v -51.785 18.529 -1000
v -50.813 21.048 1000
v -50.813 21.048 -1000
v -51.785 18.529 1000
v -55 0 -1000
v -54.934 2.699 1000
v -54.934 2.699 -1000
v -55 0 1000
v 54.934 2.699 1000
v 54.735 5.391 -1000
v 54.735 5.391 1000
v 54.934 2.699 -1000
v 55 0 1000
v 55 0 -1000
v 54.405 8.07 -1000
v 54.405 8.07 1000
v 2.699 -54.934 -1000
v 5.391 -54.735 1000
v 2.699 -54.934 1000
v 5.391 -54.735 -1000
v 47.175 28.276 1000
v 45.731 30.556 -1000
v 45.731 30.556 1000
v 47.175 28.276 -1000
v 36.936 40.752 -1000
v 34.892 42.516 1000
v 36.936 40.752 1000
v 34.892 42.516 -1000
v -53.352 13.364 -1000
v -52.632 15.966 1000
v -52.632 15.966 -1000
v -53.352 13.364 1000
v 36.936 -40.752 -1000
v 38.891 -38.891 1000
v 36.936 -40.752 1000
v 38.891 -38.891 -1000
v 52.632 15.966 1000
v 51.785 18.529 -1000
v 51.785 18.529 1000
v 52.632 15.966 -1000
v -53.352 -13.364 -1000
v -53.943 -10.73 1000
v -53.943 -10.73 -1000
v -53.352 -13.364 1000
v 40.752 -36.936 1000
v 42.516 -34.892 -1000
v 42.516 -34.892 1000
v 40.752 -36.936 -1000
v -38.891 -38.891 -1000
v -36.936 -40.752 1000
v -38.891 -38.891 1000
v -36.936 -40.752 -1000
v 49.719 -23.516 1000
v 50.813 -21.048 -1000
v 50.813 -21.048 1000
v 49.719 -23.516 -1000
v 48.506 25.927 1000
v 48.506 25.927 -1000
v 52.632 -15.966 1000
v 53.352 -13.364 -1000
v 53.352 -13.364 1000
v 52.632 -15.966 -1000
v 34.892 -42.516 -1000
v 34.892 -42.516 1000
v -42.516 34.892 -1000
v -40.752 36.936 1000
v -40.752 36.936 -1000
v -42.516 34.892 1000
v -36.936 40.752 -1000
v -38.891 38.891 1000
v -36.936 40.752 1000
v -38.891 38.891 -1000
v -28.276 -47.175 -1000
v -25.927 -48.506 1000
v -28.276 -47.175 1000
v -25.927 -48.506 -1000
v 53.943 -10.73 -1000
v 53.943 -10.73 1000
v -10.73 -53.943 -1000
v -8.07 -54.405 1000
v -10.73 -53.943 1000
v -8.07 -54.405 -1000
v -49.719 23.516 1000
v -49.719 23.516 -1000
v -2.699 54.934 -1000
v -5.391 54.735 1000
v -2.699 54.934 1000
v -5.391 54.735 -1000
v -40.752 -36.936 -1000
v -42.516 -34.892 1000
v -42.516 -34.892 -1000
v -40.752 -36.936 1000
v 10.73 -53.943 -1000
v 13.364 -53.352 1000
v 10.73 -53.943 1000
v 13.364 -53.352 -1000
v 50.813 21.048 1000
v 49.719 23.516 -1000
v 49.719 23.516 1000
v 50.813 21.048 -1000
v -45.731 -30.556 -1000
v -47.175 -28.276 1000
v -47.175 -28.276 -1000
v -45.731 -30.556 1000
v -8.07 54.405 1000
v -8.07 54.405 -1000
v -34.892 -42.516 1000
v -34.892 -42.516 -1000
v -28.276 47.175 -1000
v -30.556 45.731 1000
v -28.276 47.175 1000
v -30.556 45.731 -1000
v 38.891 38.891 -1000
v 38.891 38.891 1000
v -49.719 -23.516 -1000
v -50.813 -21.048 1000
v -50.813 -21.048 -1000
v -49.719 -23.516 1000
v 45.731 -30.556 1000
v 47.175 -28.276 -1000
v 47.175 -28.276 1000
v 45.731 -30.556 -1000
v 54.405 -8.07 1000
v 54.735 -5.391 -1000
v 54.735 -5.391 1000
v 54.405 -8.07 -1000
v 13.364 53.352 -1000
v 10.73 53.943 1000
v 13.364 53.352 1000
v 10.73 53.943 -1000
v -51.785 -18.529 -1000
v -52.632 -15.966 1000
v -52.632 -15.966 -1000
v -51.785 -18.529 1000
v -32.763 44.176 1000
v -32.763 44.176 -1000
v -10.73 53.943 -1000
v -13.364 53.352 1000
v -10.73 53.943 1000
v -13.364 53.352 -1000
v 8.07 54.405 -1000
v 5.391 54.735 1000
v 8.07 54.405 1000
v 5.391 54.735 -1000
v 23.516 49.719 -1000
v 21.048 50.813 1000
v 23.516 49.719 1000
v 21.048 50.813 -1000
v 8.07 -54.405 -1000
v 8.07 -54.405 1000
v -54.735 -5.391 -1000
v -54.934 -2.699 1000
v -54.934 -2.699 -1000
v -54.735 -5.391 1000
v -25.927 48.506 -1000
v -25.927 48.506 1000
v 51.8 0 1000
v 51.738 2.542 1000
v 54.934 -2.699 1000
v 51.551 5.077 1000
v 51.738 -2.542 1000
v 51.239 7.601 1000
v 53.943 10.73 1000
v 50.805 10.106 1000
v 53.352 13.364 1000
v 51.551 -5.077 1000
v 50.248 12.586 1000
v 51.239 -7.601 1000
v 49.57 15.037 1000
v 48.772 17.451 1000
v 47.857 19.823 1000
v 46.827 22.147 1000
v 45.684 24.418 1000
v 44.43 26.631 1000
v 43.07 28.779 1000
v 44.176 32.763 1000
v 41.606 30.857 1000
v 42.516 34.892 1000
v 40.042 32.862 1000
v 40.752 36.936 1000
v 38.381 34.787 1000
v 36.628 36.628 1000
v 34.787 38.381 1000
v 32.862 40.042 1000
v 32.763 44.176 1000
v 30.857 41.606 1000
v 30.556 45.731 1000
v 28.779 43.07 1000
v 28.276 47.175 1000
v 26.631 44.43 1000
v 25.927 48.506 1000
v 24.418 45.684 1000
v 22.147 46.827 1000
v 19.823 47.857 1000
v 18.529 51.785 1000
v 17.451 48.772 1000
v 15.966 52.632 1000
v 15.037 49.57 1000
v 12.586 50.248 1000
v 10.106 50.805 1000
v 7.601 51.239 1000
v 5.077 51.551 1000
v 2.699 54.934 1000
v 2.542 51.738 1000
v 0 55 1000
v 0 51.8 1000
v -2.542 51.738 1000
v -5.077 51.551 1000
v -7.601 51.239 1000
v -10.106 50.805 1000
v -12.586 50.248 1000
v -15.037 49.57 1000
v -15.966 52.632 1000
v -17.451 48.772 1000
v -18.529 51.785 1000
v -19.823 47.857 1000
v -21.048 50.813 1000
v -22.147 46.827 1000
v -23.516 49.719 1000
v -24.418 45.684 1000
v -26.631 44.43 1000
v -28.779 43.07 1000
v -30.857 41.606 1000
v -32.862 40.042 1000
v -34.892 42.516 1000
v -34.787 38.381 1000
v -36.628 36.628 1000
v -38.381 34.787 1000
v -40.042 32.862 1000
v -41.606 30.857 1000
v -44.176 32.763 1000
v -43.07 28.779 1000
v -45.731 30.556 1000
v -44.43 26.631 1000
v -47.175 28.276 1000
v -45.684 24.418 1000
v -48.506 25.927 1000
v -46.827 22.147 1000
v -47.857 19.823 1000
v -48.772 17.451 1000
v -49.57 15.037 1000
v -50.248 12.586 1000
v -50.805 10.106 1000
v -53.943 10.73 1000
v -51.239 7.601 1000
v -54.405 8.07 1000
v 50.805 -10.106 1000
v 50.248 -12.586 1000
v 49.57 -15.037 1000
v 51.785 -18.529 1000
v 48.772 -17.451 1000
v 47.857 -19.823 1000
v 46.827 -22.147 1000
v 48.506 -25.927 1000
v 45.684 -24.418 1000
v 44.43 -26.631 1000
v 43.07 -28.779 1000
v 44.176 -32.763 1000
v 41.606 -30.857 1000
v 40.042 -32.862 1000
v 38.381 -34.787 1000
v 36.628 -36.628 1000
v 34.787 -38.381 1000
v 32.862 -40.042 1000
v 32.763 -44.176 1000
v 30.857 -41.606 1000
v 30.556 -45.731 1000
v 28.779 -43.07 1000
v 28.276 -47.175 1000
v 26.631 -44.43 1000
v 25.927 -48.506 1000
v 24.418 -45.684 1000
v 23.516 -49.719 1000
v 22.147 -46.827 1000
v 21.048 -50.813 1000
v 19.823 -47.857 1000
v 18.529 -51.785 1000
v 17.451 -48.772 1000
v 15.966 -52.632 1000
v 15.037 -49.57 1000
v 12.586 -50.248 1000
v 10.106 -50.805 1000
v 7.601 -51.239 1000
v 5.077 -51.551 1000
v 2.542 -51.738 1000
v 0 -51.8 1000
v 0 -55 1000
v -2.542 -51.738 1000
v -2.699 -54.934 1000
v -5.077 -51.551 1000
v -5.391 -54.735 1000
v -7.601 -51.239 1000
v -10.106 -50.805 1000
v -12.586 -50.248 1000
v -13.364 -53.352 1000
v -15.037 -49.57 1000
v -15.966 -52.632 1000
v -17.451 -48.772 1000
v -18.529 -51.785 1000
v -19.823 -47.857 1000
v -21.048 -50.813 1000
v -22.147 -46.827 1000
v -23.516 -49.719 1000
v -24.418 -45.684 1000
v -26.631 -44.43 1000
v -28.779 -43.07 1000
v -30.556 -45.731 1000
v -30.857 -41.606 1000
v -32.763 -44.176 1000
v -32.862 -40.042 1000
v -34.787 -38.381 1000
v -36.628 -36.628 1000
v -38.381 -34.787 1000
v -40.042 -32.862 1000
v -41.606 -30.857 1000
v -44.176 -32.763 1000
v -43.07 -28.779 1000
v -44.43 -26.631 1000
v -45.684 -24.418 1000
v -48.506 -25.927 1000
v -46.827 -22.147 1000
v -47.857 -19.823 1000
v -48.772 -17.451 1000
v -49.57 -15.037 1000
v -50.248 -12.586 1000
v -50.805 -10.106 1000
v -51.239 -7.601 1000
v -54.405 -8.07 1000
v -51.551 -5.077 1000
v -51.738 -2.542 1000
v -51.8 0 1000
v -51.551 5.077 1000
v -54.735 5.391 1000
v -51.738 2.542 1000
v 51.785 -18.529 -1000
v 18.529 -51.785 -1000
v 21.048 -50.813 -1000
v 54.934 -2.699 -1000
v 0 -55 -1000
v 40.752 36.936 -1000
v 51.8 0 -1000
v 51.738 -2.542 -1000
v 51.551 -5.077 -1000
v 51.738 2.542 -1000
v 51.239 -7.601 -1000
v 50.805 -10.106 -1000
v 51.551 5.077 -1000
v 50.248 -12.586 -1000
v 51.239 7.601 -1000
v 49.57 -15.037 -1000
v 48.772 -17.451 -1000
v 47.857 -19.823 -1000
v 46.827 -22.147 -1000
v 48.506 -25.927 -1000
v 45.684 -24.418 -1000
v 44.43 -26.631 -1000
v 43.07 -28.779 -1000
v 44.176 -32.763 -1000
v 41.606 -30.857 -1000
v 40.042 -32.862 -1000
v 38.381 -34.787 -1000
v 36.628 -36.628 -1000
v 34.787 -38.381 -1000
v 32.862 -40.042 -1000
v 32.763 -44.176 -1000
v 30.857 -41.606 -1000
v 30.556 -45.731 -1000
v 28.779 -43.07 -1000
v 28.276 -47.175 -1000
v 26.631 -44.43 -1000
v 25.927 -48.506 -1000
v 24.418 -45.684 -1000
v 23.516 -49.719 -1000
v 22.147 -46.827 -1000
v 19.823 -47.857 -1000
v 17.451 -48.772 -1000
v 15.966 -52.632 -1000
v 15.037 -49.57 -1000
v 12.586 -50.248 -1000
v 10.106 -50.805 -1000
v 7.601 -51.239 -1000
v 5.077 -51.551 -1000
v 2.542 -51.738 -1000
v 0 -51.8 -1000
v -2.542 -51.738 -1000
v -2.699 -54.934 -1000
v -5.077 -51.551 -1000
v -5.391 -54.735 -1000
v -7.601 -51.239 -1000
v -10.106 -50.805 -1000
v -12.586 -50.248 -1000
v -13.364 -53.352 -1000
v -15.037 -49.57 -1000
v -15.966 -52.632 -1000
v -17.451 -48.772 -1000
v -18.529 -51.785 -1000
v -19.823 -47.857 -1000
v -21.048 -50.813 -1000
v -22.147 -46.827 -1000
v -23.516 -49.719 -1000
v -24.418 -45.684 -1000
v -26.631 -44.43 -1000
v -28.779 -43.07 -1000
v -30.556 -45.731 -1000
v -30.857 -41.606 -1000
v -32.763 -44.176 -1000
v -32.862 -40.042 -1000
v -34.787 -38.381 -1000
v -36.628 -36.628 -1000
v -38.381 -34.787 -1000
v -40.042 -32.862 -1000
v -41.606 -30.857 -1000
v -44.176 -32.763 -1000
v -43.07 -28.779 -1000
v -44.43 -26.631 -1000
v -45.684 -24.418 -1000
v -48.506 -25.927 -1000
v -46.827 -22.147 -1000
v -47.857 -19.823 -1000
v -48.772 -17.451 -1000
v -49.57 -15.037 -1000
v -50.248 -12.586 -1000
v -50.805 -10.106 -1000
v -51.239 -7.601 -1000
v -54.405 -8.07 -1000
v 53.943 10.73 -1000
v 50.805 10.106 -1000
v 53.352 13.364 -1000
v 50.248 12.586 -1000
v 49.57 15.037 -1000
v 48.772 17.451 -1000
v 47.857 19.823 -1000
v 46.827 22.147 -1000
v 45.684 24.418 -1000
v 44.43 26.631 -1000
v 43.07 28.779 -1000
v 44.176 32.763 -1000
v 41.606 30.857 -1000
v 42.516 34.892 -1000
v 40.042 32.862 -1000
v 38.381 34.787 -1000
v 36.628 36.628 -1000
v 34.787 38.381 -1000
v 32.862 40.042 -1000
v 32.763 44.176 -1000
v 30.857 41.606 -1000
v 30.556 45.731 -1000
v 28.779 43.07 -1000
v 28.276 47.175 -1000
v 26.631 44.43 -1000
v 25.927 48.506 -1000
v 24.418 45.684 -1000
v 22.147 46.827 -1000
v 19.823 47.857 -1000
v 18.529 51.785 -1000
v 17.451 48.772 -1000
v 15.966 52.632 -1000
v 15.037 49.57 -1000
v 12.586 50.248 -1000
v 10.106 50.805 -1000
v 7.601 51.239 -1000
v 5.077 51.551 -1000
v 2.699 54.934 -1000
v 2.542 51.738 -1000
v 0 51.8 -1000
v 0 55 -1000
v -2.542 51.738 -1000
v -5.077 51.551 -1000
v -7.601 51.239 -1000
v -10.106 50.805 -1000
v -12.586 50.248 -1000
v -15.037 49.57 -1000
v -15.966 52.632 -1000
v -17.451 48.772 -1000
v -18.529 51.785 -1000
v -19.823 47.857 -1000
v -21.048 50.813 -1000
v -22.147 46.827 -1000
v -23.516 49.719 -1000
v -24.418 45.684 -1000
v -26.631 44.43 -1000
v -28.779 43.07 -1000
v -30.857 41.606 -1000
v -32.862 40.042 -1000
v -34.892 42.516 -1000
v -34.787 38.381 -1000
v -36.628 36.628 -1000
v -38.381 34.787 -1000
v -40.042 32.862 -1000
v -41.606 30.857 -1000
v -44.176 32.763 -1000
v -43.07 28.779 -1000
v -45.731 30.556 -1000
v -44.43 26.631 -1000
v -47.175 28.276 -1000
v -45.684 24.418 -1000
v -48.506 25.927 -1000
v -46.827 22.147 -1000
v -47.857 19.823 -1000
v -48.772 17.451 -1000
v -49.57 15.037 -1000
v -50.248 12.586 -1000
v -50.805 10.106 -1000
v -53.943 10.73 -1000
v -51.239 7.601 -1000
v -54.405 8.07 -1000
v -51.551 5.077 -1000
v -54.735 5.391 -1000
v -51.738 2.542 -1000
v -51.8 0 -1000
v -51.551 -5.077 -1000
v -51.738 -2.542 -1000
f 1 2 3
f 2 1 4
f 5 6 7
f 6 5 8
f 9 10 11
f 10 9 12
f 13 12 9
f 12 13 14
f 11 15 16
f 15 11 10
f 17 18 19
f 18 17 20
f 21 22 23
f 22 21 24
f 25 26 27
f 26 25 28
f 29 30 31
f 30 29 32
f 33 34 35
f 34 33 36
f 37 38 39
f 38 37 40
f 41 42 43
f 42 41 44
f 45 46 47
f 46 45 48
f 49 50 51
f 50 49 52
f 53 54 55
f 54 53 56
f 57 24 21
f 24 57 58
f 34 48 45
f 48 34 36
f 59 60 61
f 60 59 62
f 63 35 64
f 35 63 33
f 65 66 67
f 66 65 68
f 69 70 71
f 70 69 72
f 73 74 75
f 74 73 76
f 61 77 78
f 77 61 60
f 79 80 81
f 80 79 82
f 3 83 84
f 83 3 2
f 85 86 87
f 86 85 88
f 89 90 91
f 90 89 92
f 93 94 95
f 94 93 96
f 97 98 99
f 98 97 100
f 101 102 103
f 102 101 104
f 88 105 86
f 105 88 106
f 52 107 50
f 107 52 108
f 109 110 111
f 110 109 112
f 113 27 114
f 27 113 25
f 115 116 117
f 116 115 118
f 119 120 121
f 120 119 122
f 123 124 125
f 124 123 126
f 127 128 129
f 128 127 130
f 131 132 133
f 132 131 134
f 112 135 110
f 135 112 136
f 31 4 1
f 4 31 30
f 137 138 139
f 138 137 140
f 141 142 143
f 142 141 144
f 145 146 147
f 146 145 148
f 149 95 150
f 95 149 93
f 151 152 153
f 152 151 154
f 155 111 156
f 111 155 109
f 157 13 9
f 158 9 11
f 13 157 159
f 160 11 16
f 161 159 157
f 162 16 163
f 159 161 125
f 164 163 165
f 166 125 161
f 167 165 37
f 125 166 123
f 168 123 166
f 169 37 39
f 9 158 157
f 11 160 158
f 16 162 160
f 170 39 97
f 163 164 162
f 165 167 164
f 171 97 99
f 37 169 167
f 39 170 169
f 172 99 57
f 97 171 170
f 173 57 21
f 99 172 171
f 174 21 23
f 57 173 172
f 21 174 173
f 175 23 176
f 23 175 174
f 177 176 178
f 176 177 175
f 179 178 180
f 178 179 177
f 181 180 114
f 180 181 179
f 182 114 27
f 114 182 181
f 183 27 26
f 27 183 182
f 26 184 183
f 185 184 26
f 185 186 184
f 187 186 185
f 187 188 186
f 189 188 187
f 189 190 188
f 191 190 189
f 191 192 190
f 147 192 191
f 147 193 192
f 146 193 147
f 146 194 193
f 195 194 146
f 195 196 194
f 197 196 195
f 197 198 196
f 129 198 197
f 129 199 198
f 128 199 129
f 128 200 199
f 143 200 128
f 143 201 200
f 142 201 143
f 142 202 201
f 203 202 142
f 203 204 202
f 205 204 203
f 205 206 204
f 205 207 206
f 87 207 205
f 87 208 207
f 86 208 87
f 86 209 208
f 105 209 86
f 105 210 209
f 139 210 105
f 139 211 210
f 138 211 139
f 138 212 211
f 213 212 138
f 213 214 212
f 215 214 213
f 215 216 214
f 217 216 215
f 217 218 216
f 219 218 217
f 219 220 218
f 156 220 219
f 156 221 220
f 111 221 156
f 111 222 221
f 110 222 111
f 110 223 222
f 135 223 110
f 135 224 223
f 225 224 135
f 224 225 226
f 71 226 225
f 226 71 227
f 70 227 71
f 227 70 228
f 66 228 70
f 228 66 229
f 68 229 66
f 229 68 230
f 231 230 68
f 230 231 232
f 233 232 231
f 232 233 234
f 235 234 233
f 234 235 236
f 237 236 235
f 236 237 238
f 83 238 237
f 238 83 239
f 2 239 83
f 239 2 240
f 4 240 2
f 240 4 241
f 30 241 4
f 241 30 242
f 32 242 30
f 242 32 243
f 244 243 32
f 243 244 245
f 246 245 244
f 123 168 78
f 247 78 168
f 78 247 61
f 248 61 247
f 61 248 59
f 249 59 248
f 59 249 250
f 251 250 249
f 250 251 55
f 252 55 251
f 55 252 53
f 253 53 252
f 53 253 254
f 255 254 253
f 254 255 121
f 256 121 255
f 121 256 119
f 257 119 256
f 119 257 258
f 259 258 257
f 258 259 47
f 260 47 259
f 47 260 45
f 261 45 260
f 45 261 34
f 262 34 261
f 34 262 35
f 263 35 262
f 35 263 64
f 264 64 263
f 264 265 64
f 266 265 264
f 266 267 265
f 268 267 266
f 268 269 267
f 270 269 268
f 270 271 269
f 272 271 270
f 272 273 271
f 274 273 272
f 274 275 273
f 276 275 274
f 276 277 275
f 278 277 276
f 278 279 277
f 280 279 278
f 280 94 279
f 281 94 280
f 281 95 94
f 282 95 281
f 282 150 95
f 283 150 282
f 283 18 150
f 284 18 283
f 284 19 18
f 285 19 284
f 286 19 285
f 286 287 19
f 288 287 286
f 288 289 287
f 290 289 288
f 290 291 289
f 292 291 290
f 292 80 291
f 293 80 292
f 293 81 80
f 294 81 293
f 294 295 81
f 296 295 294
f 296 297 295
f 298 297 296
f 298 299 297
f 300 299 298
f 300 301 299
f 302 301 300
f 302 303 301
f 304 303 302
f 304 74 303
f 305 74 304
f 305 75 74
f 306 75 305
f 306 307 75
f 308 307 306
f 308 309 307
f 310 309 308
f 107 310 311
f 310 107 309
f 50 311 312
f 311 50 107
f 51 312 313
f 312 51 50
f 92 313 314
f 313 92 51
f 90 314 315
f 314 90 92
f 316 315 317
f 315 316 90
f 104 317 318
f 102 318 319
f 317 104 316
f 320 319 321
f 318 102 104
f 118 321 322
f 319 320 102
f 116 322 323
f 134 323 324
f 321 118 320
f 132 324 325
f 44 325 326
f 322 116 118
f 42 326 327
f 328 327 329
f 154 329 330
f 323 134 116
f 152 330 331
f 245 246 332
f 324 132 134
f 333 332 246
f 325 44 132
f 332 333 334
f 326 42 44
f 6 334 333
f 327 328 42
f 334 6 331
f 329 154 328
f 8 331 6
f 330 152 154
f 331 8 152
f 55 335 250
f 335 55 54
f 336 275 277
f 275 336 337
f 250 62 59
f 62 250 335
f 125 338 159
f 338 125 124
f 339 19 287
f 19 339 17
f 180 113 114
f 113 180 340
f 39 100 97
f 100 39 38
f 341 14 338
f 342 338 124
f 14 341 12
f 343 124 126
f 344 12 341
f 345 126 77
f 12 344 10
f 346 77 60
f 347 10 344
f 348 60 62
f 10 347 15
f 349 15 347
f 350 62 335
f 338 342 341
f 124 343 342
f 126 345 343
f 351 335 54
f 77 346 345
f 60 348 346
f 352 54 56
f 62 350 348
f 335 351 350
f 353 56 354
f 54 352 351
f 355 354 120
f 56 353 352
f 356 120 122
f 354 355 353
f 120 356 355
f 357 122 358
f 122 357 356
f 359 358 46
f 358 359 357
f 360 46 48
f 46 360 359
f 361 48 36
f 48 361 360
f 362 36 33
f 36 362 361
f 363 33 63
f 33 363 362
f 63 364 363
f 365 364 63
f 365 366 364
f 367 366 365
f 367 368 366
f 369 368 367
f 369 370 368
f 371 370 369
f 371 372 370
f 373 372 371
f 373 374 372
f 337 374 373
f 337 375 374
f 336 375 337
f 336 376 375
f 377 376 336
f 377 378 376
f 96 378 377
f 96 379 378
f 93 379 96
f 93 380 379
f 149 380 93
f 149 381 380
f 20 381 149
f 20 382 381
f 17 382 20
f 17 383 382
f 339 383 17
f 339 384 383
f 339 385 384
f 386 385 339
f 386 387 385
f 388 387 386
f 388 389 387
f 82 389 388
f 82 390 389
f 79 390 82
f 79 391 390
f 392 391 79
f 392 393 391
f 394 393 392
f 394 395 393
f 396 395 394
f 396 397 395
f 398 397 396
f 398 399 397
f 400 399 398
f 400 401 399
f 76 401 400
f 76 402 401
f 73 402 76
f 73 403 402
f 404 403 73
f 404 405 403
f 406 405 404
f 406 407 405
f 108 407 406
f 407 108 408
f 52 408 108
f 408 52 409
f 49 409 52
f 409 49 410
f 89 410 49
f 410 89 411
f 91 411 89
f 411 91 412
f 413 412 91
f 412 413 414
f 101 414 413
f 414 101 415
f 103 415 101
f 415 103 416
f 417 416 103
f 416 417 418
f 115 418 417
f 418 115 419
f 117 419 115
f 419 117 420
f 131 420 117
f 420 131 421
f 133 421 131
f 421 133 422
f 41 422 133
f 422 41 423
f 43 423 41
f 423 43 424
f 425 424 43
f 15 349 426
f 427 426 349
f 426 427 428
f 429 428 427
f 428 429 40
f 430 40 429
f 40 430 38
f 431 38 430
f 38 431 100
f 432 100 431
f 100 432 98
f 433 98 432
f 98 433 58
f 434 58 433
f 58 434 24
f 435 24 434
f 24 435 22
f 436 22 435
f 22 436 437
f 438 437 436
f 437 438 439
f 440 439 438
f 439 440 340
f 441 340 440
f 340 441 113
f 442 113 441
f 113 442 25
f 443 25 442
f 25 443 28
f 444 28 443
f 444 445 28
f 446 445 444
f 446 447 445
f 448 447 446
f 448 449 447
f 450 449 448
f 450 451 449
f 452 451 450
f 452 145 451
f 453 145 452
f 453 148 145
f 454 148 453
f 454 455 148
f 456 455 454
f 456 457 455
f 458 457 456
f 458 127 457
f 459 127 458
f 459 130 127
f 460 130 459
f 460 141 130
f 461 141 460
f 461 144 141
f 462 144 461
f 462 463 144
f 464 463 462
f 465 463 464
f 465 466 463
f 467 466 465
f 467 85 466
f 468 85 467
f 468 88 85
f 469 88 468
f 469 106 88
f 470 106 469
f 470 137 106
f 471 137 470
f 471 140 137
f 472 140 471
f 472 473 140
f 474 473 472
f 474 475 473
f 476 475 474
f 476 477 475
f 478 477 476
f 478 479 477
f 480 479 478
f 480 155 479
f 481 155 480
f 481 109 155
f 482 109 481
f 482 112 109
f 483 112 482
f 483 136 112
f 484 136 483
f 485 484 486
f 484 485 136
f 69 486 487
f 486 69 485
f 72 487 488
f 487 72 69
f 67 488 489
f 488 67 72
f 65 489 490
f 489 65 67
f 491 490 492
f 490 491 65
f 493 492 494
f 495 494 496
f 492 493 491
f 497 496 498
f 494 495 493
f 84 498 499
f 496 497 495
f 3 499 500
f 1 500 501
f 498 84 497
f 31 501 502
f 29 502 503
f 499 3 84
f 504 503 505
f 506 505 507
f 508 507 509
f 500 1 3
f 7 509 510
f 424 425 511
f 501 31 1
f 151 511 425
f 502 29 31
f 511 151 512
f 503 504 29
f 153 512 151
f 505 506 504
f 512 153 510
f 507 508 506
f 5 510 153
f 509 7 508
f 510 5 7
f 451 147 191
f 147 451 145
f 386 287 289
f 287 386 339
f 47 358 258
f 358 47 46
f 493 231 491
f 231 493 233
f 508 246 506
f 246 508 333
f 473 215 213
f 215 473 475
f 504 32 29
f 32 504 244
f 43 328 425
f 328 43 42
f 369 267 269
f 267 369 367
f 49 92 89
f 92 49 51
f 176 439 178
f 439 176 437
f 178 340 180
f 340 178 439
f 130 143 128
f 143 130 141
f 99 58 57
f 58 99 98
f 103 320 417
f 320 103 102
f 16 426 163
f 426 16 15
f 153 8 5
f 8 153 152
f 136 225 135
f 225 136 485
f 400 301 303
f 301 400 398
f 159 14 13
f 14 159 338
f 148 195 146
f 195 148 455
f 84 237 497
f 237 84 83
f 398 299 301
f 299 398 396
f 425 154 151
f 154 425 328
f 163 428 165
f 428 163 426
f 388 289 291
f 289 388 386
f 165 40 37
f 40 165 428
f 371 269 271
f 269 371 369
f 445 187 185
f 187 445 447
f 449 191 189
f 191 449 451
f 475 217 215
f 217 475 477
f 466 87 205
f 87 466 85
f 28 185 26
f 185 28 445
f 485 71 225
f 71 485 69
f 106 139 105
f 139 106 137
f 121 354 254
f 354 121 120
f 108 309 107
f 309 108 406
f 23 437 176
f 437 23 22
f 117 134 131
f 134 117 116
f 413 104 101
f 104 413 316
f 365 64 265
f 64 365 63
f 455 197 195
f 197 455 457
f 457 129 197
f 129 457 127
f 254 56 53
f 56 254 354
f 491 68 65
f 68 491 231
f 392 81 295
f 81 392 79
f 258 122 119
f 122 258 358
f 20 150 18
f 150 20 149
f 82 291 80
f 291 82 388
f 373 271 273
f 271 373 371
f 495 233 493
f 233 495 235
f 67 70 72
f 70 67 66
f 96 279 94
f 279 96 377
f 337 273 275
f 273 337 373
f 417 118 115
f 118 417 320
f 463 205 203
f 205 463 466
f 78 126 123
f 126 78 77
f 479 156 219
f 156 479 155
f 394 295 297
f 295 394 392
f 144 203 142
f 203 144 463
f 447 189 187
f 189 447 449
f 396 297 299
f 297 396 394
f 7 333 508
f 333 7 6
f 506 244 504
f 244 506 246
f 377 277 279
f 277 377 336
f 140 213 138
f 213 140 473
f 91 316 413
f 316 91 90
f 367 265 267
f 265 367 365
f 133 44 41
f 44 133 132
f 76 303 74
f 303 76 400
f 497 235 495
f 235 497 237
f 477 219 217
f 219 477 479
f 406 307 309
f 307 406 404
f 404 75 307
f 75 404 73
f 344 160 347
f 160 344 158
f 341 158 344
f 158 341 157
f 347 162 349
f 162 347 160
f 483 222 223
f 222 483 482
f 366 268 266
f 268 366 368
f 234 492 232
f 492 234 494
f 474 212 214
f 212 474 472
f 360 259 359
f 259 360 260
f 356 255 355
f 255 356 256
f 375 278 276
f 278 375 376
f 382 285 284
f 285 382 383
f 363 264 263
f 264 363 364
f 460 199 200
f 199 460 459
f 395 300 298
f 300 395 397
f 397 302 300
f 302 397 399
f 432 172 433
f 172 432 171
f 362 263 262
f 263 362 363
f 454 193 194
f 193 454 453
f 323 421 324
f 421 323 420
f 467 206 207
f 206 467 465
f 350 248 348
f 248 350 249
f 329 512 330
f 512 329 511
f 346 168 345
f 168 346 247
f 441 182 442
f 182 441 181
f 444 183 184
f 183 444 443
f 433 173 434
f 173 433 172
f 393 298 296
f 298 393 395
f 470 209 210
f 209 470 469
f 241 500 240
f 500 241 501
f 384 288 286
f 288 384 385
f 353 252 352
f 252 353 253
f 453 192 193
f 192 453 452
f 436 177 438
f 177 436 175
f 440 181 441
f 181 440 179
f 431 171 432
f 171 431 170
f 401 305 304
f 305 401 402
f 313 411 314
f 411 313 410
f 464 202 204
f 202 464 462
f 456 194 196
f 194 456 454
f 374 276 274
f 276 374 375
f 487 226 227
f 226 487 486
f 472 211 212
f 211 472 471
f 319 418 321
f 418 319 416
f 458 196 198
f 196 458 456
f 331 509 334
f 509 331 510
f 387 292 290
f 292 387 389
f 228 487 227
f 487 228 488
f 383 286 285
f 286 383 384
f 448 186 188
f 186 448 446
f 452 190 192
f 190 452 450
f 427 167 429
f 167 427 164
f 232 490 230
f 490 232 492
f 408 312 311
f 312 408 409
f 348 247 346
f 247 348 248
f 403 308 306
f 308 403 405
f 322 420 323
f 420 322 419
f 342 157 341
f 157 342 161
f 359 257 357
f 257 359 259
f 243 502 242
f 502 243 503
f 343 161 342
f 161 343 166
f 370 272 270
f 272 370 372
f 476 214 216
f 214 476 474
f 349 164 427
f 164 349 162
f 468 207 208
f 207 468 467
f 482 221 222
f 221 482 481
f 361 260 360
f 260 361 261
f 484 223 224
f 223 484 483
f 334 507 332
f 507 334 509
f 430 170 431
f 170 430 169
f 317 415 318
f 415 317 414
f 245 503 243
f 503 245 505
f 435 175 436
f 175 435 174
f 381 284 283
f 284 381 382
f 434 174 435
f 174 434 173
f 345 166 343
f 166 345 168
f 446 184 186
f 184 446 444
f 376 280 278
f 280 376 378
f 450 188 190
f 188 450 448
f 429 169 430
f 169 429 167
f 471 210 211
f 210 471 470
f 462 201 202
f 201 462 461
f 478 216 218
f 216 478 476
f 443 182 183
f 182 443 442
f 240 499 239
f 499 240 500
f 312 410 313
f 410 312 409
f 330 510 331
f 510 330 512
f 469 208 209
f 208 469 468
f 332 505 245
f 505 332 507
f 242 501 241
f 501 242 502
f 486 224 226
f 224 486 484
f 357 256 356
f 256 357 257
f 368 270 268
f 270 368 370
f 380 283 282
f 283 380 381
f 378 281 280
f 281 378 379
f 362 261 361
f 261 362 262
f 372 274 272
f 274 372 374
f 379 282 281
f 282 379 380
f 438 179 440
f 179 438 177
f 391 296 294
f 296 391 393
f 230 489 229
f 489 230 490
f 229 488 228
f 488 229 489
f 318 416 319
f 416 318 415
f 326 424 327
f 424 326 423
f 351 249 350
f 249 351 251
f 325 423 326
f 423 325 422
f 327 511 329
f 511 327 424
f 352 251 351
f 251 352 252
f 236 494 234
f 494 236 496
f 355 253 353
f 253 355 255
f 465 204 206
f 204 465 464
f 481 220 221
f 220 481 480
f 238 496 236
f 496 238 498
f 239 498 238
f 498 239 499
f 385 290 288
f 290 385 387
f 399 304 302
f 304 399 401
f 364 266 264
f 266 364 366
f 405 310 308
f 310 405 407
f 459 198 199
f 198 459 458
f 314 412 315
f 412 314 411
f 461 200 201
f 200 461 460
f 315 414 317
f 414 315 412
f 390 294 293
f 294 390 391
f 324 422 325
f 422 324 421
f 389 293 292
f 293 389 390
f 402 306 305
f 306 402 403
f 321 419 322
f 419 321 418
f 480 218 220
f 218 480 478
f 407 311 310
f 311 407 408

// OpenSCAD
$fn=128;

module ht_pipe(od=110, length=2000, wall=3.2) {
    id = od - 2*wall;
    difference() {
        cylinder(h=length, d=od, center=true);
        cylinder(h=length+2, d=id, center=true);
    }
}

ht_pipe(od=110, length=2000, wall=3.2);
